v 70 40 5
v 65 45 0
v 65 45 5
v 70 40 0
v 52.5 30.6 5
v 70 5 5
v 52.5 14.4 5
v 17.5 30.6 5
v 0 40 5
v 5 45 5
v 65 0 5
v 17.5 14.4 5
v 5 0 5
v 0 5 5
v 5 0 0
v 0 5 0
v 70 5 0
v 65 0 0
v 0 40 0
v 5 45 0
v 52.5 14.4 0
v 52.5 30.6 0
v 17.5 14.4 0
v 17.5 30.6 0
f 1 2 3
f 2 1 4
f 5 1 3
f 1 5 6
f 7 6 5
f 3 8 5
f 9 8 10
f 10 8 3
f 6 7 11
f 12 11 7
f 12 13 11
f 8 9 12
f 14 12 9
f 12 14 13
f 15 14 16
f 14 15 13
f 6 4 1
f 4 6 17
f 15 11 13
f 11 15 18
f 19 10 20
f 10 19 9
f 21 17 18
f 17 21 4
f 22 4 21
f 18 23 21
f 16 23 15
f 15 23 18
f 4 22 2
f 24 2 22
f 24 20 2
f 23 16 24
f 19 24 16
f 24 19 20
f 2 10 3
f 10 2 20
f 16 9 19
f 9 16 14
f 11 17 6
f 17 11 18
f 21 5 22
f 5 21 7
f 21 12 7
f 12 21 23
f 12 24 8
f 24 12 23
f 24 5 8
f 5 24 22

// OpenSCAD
$fn = 32;

// ----------------------------------------------------------------------
// Windowed plate: 1 voids, 70 x 45 x 5 mm
// ----------------------------------------------------------------------

// --- parameters (mm) ---
plate_l = 70;             // plate length, X
plate_w = 45;             // plate width, Y
plate_t = 5;              // plate thickness, Z
edge_margin = 10;         // wall from the plate edge to any window
win1_l = 35;              // window length
win1_w = 16.2;            // window width
depth_1 = 5;              // depth of void 1 (full thickness = through)
corner_c = 5;             // corner chamfer of the plate

profile = [[5, 0], [65, 0], [70, 5], [70, 40], [65, 45], [5, 45], [0, 40], [0, 5]];  // primary outline, 8 points, counter clockwise
void_1 = [[17.5, 14.4], [52.5, 14.4], [52.5, 30.6], [17.5, 30.6]];  // large central window, 4 points

// --- the one profile operation ---
difference() {
  linear_extrude(height = plate_t) polygon(points = profile);
  translate([0, 0, -1])
    linear_extrude(height = plate_t + 2) polygon(points = void_1);
}
